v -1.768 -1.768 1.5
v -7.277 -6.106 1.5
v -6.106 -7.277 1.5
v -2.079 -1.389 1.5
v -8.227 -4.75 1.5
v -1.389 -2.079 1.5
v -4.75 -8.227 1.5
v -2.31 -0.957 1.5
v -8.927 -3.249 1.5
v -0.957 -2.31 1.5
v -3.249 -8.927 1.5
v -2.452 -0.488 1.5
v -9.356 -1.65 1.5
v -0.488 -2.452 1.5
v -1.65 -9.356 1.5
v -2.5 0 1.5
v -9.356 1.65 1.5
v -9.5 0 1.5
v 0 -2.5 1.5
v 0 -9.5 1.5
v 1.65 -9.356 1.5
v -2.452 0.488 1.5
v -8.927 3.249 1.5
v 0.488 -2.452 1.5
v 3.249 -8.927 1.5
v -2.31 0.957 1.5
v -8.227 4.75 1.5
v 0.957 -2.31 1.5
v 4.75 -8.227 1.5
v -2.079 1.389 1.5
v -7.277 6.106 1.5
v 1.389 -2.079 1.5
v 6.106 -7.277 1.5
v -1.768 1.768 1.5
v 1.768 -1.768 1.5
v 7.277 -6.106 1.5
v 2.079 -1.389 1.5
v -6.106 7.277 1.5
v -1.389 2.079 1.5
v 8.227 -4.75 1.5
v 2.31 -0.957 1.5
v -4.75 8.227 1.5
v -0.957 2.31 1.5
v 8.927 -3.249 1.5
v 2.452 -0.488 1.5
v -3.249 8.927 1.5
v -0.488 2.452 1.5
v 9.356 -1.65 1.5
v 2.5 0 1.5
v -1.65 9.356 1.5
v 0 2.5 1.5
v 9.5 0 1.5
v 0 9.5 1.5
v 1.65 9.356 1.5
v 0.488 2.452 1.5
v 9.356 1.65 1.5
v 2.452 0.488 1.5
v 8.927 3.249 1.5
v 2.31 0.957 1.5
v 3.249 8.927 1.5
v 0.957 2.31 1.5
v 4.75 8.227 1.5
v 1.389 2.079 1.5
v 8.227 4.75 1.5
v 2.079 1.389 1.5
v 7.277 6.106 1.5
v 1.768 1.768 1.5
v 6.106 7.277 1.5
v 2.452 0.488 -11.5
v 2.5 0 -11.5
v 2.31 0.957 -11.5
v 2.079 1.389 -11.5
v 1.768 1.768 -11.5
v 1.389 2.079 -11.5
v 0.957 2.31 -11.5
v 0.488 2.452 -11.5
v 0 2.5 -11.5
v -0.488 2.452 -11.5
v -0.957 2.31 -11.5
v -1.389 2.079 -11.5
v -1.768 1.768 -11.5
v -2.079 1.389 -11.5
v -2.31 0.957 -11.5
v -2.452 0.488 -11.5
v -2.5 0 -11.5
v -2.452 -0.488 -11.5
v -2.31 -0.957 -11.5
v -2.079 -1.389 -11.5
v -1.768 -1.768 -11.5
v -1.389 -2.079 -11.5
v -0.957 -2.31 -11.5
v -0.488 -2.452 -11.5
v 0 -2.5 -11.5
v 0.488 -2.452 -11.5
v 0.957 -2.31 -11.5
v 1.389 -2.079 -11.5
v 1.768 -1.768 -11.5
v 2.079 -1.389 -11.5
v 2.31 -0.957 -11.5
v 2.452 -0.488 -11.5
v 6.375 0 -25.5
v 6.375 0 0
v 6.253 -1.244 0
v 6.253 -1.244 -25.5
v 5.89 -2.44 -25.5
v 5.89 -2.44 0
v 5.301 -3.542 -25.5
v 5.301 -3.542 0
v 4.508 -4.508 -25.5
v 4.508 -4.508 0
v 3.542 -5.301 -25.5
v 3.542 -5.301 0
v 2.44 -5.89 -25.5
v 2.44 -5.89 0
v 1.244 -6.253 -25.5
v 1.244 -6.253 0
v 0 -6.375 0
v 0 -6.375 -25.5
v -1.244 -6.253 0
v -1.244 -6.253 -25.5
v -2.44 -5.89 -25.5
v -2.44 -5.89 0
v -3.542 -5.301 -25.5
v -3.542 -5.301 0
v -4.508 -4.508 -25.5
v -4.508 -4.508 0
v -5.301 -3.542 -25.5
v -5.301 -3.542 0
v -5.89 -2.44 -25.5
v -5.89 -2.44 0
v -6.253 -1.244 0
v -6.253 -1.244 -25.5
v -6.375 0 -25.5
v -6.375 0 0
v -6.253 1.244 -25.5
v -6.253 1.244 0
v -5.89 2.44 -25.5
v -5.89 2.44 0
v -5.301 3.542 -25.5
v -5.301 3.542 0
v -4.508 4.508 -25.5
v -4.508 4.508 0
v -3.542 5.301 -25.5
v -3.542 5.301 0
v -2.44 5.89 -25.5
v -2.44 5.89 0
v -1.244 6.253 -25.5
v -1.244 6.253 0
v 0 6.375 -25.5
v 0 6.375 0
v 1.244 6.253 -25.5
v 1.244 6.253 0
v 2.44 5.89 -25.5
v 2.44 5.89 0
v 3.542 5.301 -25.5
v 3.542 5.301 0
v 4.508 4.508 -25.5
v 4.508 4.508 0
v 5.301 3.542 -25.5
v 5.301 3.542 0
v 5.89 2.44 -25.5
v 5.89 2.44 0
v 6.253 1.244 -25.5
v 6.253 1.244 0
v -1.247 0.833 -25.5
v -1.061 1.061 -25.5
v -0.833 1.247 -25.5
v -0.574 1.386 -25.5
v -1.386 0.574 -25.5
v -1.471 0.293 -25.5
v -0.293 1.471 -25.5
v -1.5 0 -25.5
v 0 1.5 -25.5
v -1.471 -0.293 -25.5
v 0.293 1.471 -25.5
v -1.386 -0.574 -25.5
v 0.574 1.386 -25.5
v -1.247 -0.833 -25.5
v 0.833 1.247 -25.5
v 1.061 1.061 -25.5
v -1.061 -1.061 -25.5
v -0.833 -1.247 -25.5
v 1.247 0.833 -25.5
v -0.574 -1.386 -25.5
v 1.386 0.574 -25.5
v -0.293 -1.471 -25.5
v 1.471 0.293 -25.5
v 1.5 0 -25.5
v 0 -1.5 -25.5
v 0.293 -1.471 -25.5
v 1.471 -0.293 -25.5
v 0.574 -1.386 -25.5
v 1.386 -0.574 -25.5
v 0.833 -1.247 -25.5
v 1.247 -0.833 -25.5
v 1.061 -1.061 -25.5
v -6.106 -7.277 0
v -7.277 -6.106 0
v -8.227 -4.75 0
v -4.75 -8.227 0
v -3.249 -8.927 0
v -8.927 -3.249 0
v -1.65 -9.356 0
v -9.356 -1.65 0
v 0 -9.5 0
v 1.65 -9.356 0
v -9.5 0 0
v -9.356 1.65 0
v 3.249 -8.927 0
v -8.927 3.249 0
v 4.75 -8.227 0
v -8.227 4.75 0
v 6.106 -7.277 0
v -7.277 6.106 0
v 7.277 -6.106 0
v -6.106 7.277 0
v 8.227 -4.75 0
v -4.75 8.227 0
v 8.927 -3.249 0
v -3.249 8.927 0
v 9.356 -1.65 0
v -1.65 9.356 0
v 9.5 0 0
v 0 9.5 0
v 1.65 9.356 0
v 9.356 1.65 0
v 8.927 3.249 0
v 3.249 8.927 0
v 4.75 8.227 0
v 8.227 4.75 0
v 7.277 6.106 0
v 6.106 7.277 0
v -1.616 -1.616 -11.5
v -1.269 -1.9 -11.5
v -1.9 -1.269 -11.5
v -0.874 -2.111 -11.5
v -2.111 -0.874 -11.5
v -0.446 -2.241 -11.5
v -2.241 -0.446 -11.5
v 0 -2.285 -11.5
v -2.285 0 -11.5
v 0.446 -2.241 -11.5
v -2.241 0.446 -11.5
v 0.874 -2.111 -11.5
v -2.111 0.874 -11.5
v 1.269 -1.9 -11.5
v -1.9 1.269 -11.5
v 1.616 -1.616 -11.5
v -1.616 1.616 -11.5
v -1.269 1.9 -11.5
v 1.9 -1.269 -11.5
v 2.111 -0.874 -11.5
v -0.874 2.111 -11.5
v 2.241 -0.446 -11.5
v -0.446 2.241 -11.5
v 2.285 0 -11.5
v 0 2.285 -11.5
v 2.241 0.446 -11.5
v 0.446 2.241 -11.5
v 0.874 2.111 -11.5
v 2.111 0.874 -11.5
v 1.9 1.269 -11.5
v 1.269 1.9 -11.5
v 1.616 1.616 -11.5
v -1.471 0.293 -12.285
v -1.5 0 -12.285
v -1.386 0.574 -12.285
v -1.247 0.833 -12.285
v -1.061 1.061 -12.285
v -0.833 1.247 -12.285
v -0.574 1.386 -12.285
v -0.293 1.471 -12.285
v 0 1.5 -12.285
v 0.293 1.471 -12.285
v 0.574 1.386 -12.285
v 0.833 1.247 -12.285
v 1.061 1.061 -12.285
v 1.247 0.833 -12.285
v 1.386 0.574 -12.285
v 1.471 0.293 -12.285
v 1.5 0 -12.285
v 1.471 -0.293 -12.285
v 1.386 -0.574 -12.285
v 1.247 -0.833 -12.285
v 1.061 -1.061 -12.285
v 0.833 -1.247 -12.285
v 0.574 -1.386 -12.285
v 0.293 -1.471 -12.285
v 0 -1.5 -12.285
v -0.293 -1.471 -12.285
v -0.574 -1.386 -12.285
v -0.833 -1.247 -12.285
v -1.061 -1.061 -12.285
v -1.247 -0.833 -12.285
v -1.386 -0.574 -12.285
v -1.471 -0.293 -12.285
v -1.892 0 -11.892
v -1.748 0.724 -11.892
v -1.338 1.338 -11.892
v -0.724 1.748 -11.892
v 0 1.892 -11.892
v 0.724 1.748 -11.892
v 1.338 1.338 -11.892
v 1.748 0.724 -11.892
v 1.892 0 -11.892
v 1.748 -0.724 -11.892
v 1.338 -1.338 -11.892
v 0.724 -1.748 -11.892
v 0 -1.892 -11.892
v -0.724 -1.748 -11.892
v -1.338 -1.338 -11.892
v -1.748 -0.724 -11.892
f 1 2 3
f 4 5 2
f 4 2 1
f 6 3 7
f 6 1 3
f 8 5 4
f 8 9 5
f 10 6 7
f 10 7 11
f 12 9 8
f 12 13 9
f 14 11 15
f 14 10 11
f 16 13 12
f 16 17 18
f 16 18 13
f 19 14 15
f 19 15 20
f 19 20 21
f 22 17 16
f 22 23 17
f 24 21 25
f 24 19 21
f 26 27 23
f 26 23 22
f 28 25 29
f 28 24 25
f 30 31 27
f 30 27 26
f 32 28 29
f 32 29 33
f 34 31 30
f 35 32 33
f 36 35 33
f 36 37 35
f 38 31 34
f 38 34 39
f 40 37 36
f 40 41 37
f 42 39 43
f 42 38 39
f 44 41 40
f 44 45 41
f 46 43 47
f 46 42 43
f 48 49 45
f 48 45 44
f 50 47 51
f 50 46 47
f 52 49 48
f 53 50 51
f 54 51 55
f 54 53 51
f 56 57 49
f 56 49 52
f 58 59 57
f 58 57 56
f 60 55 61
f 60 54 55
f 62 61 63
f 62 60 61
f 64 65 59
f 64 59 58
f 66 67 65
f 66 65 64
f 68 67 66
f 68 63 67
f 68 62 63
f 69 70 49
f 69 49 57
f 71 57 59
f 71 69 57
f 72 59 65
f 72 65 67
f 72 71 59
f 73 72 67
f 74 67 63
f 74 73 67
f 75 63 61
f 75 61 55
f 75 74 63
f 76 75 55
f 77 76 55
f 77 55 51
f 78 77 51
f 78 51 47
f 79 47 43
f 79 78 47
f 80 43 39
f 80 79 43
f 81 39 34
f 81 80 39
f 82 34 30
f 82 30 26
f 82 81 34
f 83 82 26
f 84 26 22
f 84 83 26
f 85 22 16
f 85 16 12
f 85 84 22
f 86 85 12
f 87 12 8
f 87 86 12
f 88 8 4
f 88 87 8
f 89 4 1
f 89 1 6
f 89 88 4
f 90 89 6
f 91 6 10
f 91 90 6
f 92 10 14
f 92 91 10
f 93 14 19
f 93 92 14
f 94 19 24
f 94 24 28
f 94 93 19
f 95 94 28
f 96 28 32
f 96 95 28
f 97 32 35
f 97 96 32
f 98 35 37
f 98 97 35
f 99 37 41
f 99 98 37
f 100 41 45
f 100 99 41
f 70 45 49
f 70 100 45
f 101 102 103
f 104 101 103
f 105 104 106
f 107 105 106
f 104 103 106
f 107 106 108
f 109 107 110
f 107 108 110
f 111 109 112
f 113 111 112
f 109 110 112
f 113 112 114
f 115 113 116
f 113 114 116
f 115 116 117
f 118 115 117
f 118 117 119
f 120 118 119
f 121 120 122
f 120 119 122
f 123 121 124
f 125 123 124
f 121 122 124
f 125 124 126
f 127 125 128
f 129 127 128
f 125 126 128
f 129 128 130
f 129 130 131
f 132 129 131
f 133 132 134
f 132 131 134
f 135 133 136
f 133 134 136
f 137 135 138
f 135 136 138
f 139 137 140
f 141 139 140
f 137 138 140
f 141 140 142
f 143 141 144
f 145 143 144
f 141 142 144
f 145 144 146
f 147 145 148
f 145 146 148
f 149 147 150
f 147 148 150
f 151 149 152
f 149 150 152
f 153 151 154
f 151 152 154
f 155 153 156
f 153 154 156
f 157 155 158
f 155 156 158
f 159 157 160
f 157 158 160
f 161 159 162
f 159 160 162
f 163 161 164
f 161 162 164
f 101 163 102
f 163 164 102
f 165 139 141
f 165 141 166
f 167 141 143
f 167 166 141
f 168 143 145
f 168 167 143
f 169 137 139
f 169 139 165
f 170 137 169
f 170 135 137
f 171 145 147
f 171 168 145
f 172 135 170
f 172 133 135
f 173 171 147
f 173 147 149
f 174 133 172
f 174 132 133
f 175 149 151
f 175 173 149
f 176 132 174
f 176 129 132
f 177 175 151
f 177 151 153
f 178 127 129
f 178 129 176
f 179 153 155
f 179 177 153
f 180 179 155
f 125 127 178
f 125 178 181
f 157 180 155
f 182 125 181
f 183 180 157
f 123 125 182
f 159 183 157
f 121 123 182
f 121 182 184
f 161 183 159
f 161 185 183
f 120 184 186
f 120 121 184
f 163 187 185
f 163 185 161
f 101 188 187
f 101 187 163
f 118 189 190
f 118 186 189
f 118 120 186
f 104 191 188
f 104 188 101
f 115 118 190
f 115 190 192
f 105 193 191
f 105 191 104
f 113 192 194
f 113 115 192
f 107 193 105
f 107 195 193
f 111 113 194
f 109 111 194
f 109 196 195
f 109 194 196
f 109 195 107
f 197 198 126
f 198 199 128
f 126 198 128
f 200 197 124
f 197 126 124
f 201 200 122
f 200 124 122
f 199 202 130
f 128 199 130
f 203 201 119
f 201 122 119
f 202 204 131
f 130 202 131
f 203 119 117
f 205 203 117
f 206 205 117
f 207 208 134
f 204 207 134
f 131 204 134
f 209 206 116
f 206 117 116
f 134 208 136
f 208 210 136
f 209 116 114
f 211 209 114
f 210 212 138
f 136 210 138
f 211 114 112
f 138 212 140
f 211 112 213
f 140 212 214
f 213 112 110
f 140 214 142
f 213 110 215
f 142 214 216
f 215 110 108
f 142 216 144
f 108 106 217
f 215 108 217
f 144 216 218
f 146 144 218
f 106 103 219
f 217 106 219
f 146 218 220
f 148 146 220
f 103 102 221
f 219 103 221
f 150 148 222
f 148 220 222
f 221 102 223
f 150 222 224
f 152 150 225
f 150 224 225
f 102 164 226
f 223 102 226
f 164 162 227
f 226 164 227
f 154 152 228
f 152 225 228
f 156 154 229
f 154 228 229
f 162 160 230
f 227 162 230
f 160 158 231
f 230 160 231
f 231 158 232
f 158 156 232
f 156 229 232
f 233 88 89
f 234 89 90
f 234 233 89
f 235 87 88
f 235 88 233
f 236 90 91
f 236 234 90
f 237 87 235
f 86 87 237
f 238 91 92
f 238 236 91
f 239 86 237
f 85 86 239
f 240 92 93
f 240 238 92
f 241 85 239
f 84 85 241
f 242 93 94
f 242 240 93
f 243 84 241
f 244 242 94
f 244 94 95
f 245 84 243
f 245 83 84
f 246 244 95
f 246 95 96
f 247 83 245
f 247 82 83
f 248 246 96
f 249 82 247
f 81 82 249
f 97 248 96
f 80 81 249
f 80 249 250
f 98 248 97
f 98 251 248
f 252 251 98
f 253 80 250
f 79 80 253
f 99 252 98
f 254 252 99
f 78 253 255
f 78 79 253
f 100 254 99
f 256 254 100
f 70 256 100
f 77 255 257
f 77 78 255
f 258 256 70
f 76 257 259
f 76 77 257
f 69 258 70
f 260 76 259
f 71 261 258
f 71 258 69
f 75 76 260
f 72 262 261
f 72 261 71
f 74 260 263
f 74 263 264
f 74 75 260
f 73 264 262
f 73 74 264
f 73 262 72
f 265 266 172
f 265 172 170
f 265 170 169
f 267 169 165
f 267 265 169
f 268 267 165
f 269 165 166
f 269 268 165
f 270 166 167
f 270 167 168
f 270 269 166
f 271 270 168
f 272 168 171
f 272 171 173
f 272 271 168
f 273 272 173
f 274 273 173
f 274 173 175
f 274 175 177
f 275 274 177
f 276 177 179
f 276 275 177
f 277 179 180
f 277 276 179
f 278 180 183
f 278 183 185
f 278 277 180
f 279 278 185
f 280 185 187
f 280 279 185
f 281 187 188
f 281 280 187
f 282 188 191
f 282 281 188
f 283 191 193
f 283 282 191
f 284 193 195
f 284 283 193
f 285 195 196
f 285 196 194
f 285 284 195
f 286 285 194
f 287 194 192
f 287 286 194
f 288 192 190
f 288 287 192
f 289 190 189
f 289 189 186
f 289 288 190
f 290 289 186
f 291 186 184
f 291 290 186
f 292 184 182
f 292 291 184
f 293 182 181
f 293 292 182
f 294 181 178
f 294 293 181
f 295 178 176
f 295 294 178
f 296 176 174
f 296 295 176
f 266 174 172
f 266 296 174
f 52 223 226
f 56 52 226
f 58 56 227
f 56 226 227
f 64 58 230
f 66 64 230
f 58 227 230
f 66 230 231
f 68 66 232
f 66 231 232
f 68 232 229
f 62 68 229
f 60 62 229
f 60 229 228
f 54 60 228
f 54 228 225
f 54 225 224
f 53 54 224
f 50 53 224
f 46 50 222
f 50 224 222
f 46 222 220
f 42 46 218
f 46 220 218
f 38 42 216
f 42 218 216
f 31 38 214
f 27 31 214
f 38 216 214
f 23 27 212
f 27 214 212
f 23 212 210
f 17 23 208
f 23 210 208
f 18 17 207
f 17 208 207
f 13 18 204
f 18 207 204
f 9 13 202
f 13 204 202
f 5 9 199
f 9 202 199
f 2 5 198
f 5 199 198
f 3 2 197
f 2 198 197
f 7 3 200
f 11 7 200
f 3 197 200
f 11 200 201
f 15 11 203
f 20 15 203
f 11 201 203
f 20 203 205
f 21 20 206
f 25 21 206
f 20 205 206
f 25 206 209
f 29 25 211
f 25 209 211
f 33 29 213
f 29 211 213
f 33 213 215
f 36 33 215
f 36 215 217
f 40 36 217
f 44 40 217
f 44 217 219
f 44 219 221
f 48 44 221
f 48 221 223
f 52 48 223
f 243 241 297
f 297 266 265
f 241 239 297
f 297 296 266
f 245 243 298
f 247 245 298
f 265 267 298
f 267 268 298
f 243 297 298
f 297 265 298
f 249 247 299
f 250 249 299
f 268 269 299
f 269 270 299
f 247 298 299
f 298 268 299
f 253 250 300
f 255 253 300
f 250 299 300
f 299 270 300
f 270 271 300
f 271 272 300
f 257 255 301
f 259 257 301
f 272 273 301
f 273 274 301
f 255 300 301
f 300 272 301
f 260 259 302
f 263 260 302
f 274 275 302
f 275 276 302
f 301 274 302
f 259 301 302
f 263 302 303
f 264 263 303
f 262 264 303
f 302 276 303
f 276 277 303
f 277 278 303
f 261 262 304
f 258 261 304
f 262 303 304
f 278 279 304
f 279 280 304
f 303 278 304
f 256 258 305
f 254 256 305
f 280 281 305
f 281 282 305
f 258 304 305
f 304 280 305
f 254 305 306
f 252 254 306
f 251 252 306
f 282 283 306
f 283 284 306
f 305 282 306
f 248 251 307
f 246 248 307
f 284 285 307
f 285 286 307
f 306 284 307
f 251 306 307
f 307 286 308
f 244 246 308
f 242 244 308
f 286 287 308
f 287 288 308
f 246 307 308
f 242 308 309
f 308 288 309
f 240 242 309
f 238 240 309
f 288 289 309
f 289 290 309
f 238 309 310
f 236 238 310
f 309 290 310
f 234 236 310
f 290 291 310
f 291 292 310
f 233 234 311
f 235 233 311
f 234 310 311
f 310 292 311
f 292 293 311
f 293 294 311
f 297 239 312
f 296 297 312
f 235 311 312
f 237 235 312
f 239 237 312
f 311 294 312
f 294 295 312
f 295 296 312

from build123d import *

# Parameters (mm, degrees)
SKETCH1_R          = 19
EXTRUDE1_DEPTH     = 3
SKETCH2_R          = 12.75
EXTRUDE2_DEPTH     = 51
EXTRUDE3_START     = -26
EXTRUDE3_OUTLINE_R = 5
EXTRUDE3_DEPTH     = 26
EXTRUDE5_START     = -28
EXTRUDE5_OUTLINE_R = 3
EXTRUDE5_DEPTH     = 28
CHAMFER1_SIZE      = 1.57
SCALE1_SCALE       = 0.5


# Read off the part's stored shape, not the designer's step: Extrude3, Extrude5
with BuildPart() as part:
    # Sketch1 → Extrude1 (new body)
    with BuildSketch(Plane.XY):
        Circle(SKETCH1_R)
    extrude(amount=EXTRUDE1_DEPTH)

    # Sketch2 → Extrude2 (add)
    with BuildSketch(Plane(origin=(0, 0, 0), x_dir=(-1, 0, 0), z_dir=(0, 0, -1))):
        with Locations(Location((0, 0, 0), (0, 0, 180))):
            Circle(SKETCH2_R)
    extrude(amount=EXTRUDE2_DEPTH)

    # Extrude3 outline → Extrude3 (cut)
    with BuildSketch(Plane.XY.offset(3).offset(EXTRUDE3_START)):
        Circle(EXTRUDE3_OUTLINE_R)
    extrude(amount=EXTRUDE3_DEPTH, mode=Mode.SUBTRACT)

    # Extrude5 outline → Extrude5 (cut)
    with BuildSketch(Plane(origin=(0, 0, -51), x_dir=(-1, 0, 0), z_dir=(0, 0, -1)).offset(EXTRUDE5_START)):
        Circle(EXTRUDE5_OUTLINE_R)
    extrude(amount=EXTRUDE5_DEPTH, mode=Mode.SUBTRACT)

    # Chamfer1
    chamfer1_edges = [part.edges().sort_by_distance(p)[0] for p in [
        (3, 0, -23),
    ]]
    chamfer(chamfer1_edges, length=CHAMFER1_SIZE)


with BuildPart() as part_1:
    # Scale1: scaled about (0, 0, 0)
    add(part.part.scale(SCALE1_SCALE))


solid = part_1.part
